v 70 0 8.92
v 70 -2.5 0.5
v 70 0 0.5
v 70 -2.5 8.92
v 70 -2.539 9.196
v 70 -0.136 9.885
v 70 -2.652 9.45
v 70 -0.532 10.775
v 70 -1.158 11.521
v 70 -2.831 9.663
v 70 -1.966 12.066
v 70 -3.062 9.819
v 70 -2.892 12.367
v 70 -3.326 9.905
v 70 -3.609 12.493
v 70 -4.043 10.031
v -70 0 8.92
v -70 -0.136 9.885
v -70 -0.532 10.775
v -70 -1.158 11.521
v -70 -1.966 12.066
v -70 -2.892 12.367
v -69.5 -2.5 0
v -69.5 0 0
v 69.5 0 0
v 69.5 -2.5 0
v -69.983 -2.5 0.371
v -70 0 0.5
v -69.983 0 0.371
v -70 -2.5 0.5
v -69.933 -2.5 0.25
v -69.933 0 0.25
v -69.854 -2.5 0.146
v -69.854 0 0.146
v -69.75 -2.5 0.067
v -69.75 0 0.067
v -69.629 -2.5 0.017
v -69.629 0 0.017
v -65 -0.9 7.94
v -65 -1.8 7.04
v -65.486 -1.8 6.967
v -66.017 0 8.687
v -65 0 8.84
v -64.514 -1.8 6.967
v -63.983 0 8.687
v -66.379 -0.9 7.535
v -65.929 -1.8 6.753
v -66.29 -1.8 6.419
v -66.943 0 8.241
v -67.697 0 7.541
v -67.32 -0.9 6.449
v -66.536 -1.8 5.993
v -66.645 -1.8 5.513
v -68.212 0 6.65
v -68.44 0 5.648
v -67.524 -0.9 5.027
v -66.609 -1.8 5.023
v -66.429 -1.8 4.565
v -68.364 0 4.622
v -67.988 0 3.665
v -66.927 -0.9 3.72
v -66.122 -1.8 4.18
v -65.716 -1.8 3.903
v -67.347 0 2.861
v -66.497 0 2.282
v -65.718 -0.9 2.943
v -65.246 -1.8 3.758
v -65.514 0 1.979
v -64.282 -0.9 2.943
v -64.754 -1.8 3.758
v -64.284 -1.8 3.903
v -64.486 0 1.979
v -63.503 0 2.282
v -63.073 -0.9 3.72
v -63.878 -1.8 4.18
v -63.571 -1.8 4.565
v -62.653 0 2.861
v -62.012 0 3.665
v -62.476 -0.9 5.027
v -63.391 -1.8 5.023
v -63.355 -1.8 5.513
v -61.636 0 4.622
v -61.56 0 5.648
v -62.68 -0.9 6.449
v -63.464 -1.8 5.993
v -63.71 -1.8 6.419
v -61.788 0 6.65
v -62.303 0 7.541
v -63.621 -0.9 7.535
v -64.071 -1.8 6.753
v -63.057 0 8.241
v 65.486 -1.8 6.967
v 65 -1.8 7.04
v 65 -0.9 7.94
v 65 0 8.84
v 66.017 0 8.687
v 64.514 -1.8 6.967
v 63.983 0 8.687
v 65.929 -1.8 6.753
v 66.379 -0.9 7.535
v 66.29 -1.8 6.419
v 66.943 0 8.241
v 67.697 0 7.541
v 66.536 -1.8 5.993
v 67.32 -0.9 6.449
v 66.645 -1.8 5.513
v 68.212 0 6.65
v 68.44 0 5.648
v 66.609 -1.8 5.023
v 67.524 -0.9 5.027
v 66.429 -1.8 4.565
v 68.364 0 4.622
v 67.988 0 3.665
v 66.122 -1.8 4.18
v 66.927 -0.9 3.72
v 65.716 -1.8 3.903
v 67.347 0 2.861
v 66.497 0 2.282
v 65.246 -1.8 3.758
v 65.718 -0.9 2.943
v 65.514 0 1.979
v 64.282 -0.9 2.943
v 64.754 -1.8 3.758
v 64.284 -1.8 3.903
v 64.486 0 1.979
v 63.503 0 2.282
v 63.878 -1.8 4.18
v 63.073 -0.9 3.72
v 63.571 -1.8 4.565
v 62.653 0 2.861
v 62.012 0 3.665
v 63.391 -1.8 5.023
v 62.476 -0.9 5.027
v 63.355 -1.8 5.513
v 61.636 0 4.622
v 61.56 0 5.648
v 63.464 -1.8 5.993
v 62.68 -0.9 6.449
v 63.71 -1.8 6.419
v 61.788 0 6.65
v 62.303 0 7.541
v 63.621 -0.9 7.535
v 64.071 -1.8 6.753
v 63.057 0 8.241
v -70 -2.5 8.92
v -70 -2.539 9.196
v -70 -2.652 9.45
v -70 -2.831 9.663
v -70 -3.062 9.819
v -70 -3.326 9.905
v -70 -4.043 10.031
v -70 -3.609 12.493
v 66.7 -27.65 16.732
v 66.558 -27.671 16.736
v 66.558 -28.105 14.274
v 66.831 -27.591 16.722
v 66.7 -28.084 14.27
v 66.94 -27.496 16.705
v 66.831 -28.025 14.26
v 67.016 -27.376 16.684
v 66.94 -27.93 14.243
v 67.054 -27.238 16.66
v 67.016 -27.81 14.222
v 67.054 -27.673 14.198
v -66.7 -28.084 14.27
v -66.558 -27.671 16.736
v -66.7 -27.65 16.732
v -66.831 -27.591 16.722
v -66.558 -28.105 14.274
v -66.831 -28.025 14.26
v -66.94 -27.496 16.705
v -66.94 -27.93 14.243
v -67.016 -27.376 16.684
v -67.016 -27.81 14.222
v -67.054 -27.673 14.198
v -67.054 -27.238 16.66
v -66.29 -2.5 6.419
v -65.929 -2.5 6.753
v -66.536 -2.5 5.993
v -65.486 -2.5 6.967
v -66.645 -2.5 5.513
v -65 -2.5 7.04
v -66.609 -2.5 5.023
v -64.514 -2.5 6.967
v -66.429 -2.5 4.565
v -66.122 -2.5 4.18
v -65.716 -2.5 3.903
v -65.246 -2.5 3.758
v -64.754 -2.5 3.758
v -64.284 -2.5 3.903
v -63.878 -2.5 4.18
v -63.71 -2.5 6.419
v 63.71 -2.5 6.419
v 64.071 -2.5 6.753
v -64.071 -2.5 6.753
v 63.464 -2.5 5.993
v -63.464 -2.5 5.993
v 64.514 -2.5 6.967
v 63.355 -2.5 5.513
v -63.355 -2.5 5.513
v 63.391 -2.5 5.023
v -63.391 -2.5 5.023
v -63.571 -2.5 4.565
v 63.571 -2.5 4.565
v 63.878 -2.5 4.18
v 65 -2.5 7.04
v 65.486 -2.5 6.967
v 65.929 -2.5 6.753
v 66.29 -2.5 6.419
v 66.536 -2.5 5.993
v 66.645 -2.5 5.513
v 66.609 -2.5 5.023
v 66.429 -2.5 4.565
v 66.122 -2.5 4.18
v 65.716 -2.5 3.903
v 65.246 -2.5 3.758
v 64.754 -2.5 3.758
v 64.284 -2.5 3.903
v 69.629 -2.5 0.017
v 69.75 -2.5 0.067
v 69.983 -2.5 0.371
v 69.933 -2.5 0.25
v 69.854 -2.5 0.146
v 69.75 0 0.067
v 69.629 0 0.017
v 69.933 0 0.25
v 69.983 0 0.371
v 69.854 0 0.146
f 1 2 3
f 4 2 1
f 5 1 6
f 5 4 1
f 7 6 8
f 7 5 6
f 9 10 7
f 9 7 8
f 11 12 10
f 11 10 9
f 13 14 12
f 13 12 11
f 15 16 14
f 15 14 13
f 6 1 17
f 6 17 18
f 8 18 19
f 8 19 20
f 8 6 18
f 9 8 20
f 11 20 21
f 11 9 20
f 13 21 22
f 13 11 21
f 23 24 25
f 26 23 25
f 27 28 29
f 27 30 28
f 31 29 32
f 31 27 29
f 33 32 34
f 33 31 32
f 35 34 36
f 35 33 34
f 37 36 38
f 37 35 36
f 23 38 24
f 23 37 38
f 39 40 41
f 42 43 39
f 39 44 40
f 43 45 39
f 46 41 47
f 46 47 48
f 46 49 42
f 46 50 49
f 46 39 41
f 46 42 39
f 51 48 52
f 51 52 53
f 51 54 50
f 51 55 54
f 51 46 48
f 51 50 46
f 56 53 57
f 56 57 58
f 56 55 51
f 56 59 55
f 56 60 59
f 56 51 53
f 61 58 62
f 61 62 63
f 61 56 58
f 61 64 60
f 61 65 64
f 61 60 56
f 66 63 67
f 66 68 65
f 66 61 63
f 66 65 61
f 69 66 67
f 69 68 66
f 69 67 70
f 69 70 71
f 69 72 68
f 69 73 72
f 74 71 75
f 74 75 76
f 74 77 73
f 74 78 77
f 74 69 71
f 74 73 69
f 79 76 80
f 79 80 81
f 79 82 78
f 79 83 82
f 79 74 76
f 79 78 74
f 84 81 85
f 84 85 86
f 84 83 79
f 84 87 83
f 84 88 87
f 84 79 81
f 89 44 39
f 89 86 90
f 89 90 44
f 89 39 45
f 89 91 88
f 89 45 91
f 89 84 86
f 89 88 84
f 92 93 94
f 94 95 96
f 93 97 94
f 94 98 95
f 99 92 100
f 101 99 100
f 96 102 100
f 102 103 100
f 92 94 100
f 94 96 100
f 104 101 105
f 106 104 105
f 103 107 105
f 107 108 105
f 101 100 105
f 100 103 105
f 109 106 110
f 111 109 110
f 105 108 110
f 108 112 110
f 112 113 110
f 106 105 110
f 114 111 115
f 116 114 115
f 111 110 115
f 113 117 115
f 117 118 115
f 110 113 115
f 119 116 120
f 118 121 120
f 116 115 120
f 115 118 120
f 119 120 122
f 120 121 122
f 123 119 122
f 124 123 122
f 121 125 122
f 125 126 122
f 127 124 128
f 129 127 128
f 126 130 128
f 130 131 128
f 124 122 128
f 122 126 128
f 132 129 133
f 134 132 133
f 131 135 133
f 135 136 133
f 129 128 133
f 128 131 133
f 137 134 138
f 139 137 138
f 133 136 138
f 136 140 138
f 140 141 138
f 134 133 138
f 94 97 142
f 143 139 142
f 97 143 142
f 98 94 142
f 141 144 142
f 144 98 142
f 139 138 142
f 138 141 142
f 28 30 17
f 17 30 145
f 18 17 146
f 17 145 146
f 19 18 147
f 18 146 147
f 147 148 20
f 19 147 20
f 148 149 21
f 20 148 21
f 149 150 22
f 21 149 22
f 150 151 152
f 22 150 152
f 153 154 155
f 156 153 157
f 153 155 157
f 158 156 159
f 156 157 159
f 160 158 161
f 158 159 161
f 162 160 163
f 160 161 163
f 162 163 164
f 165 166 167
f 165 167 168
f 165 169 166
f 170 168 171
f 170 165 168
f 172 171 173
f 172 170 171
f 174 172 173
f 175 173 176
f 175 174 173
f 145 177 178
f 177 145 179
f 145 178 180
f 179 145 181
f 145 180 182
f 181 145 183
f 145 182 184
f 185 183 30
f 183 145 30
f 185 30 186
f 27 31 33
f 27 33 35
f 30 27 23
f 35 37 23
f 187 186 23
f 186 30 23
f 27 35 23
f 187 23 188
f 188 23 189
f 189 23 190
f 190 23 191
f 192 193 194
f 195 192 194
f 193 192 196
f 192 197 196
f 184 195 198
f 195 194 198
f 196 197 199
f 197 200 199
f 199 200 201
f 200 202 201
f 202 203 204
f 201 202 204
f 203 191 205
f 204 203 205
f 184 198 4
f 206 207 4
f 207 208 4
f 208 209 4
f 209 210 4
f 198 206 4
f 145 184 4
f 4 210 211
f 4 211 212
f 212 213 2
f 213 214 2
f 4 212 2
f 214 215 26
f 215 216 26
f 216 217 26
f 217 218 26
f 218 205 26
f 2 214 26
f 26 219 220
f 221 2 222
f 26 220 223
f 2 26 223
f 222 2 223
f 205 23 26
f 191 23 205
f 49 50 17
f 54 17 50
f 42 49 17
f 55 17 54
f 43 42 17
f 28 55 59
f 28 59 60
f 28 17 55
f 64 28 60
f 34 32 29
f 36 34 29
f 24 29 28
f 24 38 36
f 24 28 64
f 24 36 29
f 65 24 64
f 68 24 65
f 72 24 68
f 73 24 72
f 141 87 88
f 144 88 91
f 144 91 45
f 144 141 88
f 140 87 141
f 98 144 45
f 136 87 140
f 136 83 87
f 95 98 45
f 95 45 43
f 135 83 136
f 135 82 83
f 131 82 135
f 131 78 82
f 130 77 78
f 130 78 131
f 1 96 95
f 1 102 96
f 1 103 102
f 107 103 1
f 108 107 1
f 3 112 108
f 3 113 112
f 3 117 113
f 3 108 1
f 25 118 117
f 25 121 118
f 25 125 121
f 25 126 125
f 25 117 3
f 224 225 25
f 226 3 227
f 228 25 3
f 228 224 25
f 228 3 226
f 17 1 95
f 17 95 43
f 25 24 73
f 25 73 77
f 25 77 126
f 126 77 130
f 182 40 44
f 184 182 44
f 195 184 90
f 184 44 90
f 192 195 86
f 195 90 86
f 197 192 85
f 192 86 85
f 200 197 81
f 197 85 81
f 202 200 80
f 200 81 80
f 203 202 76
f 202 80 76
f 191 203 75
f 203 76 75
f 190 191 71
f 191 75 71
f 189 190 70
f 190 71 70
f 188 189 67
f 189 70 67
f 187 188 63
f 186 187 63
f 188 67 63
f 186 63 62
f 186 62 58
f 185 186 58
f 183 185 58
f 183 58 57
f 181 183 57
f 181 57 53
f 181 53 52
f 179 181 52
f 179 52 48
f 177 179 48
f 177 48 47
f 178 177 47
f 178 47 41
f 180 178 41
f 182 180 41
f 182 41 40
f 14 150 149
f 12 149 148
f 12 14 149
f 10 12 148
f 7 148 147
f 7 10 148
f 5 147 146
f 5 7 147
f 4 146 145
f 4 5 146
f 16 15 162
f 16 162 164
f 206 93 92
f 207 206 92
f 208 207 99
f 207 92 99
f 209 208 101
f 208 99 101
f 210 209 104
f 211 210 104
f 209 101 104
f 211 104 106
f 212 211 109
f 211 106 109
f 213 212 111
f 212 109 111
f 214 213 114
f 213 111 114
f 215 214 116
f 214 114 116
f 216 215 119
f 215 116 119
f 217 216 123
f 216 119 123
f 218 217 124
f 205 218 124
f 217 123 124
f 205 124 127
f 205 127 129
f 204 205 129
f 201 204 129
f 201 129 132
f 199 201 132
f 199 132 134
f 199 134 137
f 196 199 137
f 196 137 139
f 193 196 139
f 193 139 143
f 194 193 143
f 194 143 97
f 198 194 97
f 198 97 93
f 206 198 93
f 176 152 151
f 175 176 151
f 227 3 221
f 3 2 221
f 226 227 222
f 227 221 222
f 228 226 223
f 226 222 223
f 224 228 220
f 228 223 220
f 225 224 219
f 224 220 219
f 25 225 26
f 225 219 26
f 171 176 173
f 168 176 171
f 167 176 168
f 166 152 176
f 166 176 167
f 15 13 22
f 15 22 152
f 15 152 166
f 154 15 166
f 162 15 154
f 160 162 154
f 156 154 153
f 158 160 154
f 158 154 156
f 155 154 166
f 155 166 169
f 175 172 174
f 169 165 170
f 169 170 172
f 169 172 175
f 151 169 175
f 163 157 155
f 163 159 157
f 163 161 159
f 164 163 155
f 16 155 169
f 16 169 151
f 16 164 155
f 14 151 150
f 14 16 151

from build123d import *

# Parameters (mm, degrees)
SKETCH1_W          = 140
SKETCH1_H          = 8.92
BASE_FLANGE1_DEPTH = 2.5
EDGE_FLANGE1_DEPTH = 140
SKETCH21_R         = 1.65
CUT_EXTRUDE1_DEPTH = 78.265670645
CHAMFER1_SIZE      = 3
CHAMFER1_SIZE2     = 24.433039284
FILLET1_R          = 0.5


# Sheet-metal steps are written as plain solids
with BuildPart() as part:
    # Sketch1 → Base-Flange1 (new body)
    with BuildSketch(Plane(origin=(0, 0, 0), x_dir=(1, 0, 0), z_dir=(0, 1, 0))):
        with Locations((0, -4.46)):
            Rectangle(SKETCH1_W, SKETCH1_H)
    extrude(amount=-BASE_FLANGE1_DEPTH)

    # Edge-Flange1 section (across the edge) → Edge-Flange1 (add)
    with BuildSketch(Plane(origin=(70, -2.5, 9.759099631), x_dir=(0, -0.17364817766693427, -0.9848077530122075), z_dir=(-1, 0, 0))):
        with BuildLine():
            Line((-2.5, 0.839099631), (-2.5, 26))
            Line((-2.5, 26), (0, 26))
            Line((0, 26), (0, 0.839099631))
            ThreePointArc((0, 0.839099631), (0.233955557, 0.196312021), (0.826351822, -0.145708122))
            Line((0.826351822, -0.145708122), (0.392231378, -2.607727504))
            ThreePointArc((0.392231378, -2.607727504), (-1.681155551, -1.410657003), (-2.5, 0.839099631))
        make_face()
    extrude(amount=EDGE_FLANGE1_DEPTH)

    # Sketch21 → Cut-Extrude1 (cut, through all)
    with BuildSketch(Plane(origin=(0, 0, 0), x_dir=(1, 0, 0), z_dir=(0, 1, 0))):
        with Locations(Location((-65, -5.39, 0), (0, 0, 270))):
            Circle(SKETCH21_R)
        with Locations(Location((65, -5.39, 0), (0, 0, 270))):
            Circle(SKETCH21_R)
    extrude(amount=-CUT_EXTRUDE1_DEPTH, mode=Mode.SUBTRACT)

    # Sketch24 → Cut-Revolve2 (revolve, cut)
    with BuildSketch(Plane(origin=(65, 0, 0), x_dir=(0, 0, -1), z_dir=(1, 0, 0)), mode=Mode.PRIVATE) as cut_revolve2_sk:
        Polygon((-5.39, 0), (-5.39, -1.8), (-3.74, -1.8), (-1.94, 0), align=None)
    cut_revolve2 = revolve(cut_revolve2_sk.sketch.rotate(Axis((65, 0, 5.39), (0, 1, 0)), 180), axis=Axis((65, 0, 5.39), (0, 1, 0)), mode=Mode.SUBTRACT)

    # Mirror2: Cut-Revolve2 across plane
    add(cut_revolve2.mirror(Plane(origin=(0, 0, 0), x_dir=(0, 0, 1), z_dir=(1, 0, 0))), mode=Mode.SUBTRACT)

    # Chamfer1
    chamfer1_edges = [part.edges().sort_by_distance(p)[0] for p in [
        (70, -27.887941356, 15.504961942),
        (-70, -27.887941356, 15.504961942),
    ]]
    chamfer1_side = [part.faces().sort_by_distance(p)[0] for p in [
        (0, -27.887941356, 15.504961942),
    ]]
    chamfer(chamfer1_edges, length=CHAMFER1_SIZE, length2=CHAMFER1_SIZE2, reference=chamfer1_side[0])

    # Fillet1
    fillet1_edges = [part.edges().sort_by_distance(p)[0] for p in [
        (67, -27.887941356, 15.504961942),
        (-67, -27.887941356, 15.504961942),
        (-70, -1.25, 0),
        (70, -1.25, 0),
    ]]
    fillet(fillet1_edges, radius=FILLET1_R)


solid = part.part
